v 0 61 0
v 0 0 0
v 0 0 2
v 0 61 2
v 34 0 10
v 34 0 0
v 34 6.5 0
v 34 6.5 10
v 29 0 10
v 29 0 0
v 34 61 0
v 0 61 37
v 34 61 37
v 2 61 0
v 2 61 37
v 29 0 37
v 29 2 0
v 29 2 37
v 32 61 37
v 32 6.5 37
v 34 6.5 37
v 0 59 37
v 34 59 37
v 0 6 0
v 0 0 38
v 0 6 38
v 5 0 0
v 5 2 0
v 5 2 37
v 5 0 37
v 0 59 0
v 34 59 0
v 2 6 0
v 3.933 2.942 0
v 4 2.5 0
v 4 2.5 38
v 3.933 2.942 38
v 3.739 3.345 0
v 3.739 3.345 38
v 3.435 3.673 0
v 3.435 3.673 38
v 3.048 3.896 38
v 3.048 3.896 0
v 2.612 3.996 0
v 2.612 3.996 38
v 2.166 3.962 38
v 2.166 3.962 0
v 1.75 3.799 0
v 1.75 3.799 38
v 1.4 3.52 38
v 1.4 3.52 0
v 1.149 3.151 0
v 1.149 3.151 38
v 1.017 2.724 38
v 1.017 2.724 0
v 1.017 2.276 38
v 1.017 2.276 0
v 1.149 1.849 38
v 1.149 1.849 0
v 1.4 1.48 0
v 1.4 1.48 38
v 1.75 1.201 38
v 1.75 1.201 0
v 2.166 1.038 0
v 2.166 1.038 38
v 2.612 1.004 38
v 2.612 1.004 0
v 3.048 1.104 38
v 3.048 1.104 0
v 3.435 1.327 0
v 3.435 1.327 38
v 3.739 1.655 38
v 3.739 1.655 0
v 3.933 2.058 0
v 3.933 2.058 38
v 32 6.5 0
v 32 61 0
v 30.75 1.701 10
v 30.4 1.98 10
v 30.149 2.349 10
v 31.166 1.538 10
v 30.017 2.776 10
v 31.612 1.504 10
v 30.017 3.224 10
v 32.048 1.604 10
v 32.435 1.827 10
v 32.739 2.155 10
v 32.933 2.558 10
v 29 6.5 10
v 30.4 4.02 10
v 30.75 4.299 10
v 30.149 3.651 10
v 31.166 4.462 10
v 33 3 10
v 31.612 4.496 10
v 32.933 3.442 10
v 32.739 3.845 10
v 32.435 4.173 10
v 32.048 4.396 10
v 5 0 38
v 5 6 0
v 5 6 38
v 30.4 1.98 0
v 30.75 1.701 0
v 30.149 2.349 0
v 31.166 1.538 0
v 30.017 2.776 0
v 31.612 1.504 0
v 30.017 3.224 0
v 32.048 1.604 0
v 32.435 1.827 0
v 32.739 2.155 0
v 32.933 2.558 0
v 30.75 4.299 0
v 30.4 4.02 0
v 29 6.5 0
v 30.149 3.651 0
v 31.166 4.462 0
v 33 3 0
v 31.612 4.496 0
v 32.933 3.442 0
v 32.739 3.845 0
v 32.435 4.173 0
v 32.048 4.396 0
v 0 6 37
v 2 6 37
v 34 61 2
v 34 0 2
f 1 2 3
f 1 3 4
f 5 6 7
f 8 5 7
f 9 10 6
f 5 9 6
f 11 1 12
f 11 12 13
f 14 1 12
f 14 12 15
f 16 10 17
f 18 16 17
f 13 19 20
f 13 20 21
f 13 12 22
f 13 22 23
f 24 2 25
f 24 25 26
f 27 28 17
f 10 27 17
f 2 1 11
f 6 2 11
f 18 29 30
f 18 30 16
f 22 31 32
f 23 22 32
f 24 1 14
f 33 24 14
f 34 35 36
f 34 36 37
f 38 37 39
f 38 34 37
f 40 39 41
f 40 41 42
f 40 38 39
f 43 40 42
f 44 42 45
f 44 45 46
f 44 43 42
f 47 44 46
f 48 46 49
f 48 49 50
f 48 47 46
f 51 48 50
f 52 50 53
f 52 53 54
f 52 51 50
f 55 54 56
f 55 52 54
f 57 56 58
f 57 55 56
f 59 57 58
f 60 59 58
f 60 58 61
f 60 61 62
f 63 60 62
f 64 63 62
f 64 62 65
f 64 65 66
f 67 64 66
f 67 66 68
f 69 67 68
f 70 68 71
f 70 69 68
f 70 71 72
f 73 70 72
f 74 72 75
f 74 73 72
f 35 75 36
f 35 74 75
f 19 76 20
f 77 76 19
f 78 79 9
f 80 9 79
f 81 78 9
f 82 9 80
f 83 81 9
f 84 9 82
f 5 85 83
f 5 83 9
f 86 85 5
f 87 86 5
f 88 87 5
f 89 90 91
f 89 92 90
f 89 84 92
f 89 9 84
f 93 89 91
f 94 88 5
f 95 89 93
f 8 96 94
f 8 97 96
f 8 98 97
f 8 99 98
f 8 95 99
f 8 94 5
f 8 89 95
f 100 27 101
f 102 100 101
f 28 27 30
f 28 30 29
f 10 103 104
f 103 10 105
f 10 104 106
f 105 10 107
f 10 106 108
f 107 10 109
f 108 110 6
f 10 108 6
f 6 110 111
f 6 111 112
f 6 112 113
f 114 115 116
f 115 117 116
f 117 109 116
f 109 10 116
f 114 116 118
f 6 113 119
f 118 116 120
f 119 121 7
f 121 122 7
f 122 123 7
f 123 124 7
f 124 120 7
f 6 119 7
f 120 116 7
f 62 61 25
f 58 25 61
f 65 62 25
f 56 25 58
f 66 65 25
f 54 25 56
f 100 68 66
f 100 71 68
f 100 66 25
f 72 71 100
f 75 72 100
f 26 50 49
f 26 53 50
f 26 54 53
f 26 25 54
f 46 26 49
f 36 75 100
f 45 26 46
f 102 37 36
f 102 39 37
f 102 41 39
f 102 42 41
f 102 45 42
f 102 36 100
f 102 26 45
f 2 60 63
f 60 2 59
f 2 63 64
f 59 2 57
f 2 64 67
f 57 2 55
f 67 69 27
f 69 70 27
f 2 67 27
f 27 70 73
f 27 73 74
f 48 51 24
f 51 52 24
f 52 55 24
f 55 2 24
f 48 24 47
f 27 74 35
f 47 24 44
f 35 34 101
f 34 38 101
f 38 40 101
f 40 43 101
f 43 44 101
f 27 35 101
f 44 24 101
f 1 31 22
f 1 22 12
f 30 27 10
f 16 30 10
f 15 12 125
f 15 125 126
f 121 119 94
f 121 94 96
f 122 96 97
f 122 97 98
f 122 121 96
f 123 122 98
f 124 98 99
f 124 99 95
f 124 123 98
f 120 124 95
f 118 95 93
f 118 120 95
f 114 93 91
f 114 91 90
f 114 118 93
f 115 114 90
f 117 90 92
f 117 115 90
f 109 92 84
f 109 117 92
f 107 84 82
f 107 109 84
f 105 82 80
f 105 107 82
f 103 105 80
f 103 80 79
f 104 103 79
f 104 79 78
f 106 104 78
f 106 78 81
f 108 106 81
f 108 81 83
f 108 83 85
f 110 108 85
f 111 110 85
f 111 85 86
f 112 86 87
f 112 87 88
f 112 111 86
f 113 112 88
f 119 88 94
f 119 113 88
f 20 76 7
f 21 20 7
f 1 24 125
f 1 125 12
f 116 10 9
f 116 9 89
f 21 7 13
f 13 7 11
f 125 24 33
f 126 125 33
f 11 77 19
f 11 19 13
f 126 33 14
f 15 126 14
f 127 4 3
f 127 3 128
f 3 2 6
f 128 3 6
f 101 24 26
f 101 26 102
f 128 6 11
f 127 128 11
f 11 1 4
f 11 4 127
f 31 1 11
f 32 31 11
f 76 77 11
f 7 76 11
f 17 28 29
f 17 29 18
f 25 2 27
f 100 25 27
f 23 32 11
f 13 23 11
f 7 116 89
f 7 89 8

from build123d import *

# Parameters (mm, degrees)
BOX_W             = 34
BOX_H             = 61
BOX_DEPTH         = 2
BOX001_W          = 2
BOX001_H          = 55
BOX001_DEPTH      = 37
BOX002_W          = 2
BOX002_H          = 54.5
BOX002_DEPTH      = 37
BOX003_W          = 34
BOX003_H          = 2
BOX003_DEPTH      = 37
BOX004_W          = 24
BOX004_H          = 2
BOX004_DEPTH      = 37
CYLINDER001_R     = 1.5
CYLINDER001_DEPTH = 10
BOX006_W          = 5
BOX006_H          = 6.5
BOX006_DEPTH      = 10
CYLINDER_R        = 1.5
CYLINDER_DEPTH    = 38
BOX005_W          = 5
BOX005_H          = 6
BOX005_DEPTH      = 38


with BuildPart() as cube:
    # Box → Box (new body)
    with BuildSketch(Plane.XY):
        with Locations((17, 30.5)):
            Rectangle(BOX_W, BOX_H)
    extrude(amount=BOX_DEPTH)


with BuildPart() as cube001:
    # Box001 → Box001 (new body)
    with BuildSketch(Plane(origin=(0, 6, 0), x_dir=(1, 0, 0), z_dir=(0, 0, 1))):
        with Locations((1, 27.5)):
            Rectangle(BOX001_W, BOX001_H)
    extrude(amount=BOX001_DEPTH)


with BuildPart() as cube002:
    # Box002 → Box002 (new body)
    with BuildSketch(Plane(origin=(32, 6.5, 0), x_dir=(1, 0, 0), z_dir=(0, 0, 1))):
        with Locations((1, 27.25)):
            Rectangle(BOX002_W, BOX002_H)
    extrude(amount=BOX002_DEPTH)


with BuildPart() as cube003:
    # Box003 → Box003 (new body)
    with BuildSketch(Plane(origin=(0, 59, 0), x_dir=(1, 0, 0), z_dir=(0, 0, 1))):
        with Locations((17, 1)):
            Rectangle(BOX003_W, BOX003_H)
    extrude(amount=BOX003_DEPTH)


with BuildPart() as cube004:
    # Box004 → Box004 (new body)
    with BuildSketch(Plane(origin=(5, 0, 0), x_dir=(1, 0, 0), z_dir=(0, 0, 1))):
        with Locations((12, 1)):
            Rectangle(BOX004_W, BOX004_H)
    extrude(amount=BOX004_DEPTH)


with BuildPart() as cylinder001:
    # Cylinder001 → Cylinder001 (new body)
    with BuildSketch(Plane(origin=(31.5, 3, 0), x_dir=(1, 0, 0), z_dir=(0, 0, 1))):
        Circle(CYLINDER001_R)
    extrude(amount=CYLINDER001_DEPTH)


with BuildPart() as cut:
    # Box006 → Box006 (new body)
    with BuildSketch(Plane(origin=(29, 0, 0), x_dir=(1, 0, 0), z_dir=(0, 0, 1))):
        with Locations((2.5, 3.25)):
            Rectangle(BOX006_W, BOX006_H)
    extrude(amount=BOX006_DEPTH)

    # Cut: cut Cylinder001
    add(cylinder001.part, mode=Mode.SUBTRACT)


with BuildPart() as cylinder:
    # Cylinder → Cylinder (new body)
    with BuildSketch(Plane(origin=(2.5, 2.5, 0), x_dir=(1, 0, 0), z_dir=(0, 0, 1))):
        Circle(CYLINDER_R)
    extrude(amount=CYLINDER_DEPTH)


with BuildPart() as cut001:
    # Box005 → Box005 (new body)
    with BuildSketch(Plane.XY):
        with Locations((2.5, 3)):
            Rectangle(BOX005_W, BOX005_H)
    extrude(amount=BOX005_DEPTH)

    # Cut001: cut Cylinder
    add(cylinder.part, mode=Mode.SUBTRACT)


solid = Compound([cube.part, cube001.part, cube002.part, cube003.part, cube004.part, cut.part, cut001.part])
